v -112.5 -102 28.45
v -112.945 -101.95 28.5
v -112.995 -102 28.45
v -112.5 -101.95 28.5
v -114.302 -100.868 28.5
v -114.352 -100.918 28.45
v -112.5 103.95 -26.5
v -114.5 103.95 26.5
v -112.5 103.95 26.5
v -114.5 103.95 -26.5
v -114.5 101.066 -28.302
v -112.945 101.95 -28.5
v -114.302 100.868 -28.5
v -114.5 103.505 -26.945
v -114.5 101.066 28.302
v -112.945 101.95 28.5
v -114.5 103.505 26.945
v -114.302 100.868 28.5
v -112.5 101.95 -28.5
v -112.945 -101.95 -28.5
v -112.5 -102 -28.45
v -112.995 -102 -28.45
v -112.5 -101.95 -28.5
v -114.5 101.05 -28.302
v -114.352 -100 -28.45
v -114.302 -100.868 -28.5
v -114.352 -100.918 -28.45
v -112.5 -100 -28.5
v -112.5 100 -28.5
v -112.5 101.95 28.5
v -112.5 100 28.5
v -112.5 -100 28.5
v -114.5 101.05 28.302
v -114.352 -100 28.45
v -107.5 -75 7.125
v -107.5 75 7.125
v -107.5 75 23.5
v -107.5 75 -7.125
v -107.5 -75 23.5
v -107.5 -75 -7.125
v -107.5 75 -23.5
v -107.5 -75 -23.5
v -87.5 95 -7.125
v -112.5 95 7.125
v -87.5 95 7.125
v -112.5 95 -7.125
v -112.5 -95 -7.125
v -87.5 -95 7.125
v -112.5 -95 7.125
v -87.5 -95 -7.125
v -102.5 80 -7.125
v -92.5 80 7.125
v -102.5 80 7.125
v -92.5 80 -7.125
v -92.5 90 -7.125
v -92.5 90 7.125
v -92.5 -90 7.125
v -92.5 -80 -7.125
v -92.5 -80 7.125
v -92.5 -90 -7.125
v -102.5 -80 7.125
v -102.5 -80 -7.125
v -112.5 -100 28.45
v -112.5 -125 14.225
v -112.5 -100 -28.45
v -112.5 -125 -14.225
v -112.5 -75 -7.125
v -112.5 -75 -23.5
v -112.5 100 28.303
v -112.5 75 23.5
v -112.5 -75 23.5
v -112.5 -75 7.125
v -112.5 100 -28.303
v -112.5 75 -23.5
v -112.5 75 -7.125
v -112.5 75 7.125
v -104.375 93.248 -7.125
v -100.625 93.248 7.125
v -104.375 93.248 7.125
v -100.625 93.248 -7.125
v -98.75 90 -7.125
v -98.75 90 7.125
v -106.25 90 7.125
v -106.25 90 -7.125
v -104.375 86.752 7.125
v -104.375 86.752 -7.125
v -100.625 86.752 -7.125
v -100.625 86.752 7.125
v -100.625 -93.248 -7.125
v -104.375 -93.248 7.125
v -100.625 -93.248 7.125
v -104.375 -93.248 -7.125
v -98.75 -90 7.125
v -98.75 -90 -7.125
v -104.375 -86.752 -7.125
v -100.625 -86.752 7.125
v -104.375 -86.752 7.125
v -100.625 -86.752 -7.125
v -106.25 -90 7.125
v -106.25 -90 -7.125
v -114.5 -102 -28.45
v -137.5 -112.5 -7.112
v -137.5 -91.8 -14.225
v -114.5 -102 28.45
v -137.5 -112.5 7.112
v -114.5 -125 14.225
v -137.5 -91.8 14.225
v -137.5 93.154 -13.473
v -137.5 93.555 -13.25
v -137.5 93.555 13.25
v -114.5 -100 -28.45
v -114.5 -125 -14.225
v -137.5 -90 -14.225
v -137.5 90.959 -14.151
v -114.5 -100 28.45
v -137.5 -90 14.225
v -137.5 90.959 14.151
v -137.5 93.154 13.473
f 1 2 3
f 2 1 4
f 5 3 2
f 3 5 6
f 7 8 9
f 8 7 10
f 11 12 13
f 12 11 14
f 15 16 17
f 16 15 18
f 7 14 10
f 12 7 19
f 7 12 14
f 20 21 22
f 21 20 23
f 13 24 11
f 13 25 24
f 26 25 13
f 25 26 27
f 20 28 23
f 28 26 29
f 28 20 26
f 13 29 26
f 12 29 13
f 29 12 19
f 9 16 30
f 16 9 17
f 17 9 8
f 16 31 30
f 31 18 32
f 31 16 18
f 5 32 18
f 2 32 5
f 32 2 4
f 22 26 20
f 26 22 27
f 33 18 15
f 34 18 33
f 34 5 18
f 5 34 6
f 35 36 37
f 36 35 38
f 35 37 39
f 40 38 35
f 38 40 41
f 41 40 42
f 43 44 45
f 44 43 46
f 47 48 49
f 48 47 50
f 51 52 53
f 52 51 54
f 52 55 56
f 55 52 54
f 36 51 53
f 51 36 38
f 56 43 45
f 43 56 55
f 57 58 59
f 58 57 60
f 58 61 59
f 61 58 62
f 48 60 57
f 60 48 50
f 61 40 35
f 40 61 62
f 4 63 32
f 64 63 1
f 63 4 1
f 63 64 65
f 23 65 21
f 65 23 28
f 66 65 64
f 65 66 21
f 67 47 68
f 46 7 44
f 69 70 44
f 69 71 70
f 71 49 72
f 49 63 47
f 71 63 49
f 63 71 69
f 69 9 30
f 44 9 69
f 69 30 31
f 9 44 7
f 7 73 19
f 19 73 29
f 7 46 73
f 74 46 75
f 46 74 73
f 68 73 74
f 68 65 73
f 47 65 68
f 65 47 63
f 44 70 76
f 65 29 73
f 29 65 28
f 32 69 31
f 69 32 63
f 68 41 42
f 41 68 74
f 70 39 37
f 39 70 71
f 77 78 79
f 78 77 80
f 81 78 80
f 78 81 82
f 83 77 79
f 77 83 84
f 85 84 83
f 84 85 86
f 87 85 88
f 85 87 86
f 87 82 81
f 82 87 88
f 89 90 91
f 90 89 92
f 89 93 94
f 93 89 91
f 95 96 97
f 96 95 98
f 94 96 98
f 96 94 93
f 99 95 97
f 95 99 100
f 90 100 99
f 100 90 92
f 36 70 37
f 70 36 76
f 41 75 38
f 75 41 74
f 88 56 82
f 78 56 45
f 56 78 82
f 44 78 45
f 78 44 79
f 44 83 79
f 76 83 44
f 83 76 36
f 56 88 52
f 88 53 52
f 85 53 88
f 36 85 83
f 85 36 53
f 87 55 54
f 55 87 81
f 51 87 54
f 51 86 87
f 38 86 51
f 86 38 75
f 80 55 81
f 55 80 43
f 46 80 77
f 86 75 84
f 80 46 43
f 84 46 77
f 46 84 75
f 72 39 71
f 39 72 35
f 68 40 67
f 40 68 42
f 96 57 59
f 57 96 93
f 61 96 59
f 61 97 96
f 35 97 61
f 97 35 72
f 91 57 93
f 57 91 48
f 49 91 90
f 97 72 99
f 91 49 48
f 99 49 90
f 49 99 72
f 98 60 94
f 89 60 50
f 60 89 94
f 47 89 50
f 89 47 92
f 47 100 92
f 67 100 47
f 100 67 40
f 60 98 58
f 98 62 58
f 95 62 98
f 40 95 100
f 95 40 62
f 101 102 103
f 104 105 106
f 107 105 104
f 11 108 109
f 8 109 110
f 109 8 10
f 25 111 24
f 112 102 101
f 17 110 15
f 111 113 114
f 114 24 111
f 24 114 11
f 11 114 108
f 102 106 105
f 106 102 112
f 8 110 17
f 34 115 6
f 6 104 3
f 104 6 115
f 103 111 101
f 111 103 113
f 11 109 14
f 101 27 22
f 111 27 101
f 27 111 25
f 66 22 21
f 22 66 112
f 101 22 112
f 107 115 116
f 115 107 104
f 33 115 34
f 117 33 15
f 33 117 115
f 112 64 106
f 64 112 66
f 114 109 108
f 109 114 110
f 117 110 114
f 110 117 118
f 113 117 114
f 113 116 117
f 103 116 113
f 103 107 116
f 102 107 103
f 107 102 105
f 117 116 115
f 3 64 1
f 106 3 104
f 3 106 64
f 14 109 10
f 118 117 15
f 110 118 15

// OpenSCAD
// file: frame-left.scad
/*
 * SPDX-FileCopyrightText: © 2023 Brian S. Stephan <bss@incorporeal.org>
 * SPDX-License-Identifier: GPL-3.0-or-later
 */

include <parameters.scad>
include <components.scad>

module base_left_frame(lower=false) {
	difference() {
		frame(lower=lower);
		// chop the right edge off
		side_chopper();
	}
}

module left_frame(lower=false) {
	difference() {
		base_left_frame(lower=lower);
		// connection holes to other frames
		frame_connection_holes();

		// cable routing hole
		frame_cable_routing_hole();

		// aux button holes
		translate([-35, 101.5, 0]) rotate([270, 0, 0]) aux_control_three_button_cluster();
		translate([-35, (frame_y/2)-neutrik_panel_thickness-4, 0]) frame_cutout();
		translate([-72, (frame_y/2)-neutrik_panel_thickness-4, 0]) frame_cutout();
		translate([2, (frame_y/2)-neutrik_panel_thickness-4, 0]) frame_cutout();

		// neutrix button hole
		translate([frame_center_to_neutrik, (frame_y/2)-neutrik_panel_thickness, 0])
			rotate([90, 0, 0]) neutrik_d_mount();
		translate([frame_center_to_neutrik, (frame_y/2)-neutrik_panel_thickness-4, 0])
			frame_cutout();
	}
}

left_frame();
// file: frame-piece-top-left-or-right.scad
/*
 * SPDX-FileCopyrightText: © 2024 Brian S. Stephan <bss@incorporeal.org>
 * SPDX-License-Identifier: GPL-3.0-or-later
 */

include <parameters.scad>
include <components.scad>
use <frame-left.scad>

module top_left_or_right_frame_piece() {
    piece_width = panel_support_width+frame_wall+frame_mount_column_width;

	intersection() {
		left_frame();
		difference() {
			// include the whole top wall (including mount columns)
			translate([0, (frame_y/2)-(piece_width/2), 0]) cube([frame_x, piece_width, frame_z], center=true);
			// ...minus the frame wall and lip on the left
			translate([-frame_x/2+frame_wall/2, 0, 0])
				cube([frame_wall, frame_y, frame_z], center=true);
			// ...minus a slot for the combining piece to go into
			cube([frame_x, frame_y-(panel_support_width+frame_wall)*2, frame_z/4], center=true);
		}
	}
}

top_left_or_right_frame_piece();
// file: frame-piece-bottom-left-or-right.scad
/*
 * SPDX-FileCopyrightText: © 2024 Brian S. Stephan <bss@incorporeal.org>
 * SPDX-License-Identifier: GPL-3.0-or-later
 */

include <parameters.scad>
include <components.scad>
use <frame-left.scad>

module bottom_left_or_right_frame_piece(lower=false) {
	piece_width = panel_support_width+frame_wall+frame_mount_column_width;
	intersection() {
		left_frame(lower=lower);
		difference() {
			// include the whole bottom wall (including mount columns)
			translate([0, -(frame_y/2)+(piece_width/2), 0]) cube([frame_x, piece_width, frame_z], center=true);
			// ...minus the frame wall and lip on the left
			translate([-frame_x/2+frame_wall/2, 0, 0])
				cube([frame_wall, frame_y, frame_z], center=true);
			// ...minus a slot for the combining piece to go into
			cube([frame_x, frame_y-(panel_support_width+frame_wall)*2, frame_z/4], center=true);
		}
	}
}

bottom_left_or_right_frame_piece();
// file: frame-piece-side.scad
/*
 * SPDX-FileCopyrightText: © 2024 Brian S. Stephan <bss@incorporeal.org>
 * SPDX-License-Identifier: GPL-3.0-or-later
 */

include <parameters.scad>
include <components.scad>
use <frame-piece-top-left-or-right.scad>
use <frame-piece-bottom-left-or-right.scad>

module side_frame_piece(lower=false) {
	piece_width = panel_support_width+frame_wall+frame_mount_column_width;
	difference() {
		// side piece is left/right agnostic
        frame(lower=lower);
		// minus the top and bottom
		top_left_or_right_frame_piece();
		bottom_left_or_right_frame_piece();
		// and just chop out the rest of the frame
		translate([piece_width, 0, 0]) cube([frame_x, frame_y+1, frame_z+1], center=true);
	}
}

side_frame_piece();
// file: frame-piece-bottom-left-or-right-extended.scad
/*
 * SPDX-FileCopyrightText: © 2024 Brian S. Stephan <bss@incorporeal.org>
 * SPDX-License-Identifier: GPL-3.0-or-later
 */

include <parameters.scad>
include <components.scad>
use <frame-piece-bottom-left-or-right.scad>

module bottom_piece_wall(lower=false) {
	// get a slice of the piece, to use it in extruding
	projection(cut=true) rotate([-90, 0, 0]) translate([0, frame_y/2-frame_bevel_height, 0])
		bottom_left_or_right_frame_piece(lower=lower);
}

module bottom_piece_extension(lower=false) {
	// combine the original with a shrunken piece to "pull" the wall out
	hull() {
		linear_extrude(height=frame_extension_y) scale([1, 0.5, 1]) bottom_piece_wall();
		linear_extrude(height=frame_bevel_height) bottom_piece_wall(lower=lower);
	}
}

module extended_bottom_left_or_right_frame_piece(lower=false) {
	bottom_left_or_right_frame_piece(lower=lower);
	translate([0, -frame_y/2+frame_bevel_height*2, 0]) rotate([90, 0, 0]) bottom_piece_extension(lower=lower);
}

extended_bottom_left_or_right_frame_piece();
// file: parameters.scad
/*
 * SPDX-FileCopyrightText: © 2023 Brian S. Stephan <bss@incorporeal.org>
 * SPDX-License-Identifier: GPL-3.0-or-later
 */

// adjustments
hole_tolerance = 0.15;

// M2
m2_screw_selftap_radius = 0.95;

// M3
m3_screw_selftap_radius = 1.3;

// M4
m4_bolt_radius = 2 + hole_tolerance;
m4_bolt_countersink_radius = 6.1 + hole_tolerance;
m4_bolt_hex_exterior_radius = 3.6 + hole_tolerance;

// 24mm button
small_button_radius = 12 + hole_tolerance;

// 30mm button
big_button_radius = 15 + hole_tolerance;

// JLF mount dimensions
lever_mount_x = 53;
lever_mount_y = 95;
lever_mount_z = 2;

// standard lever hole
lever_plate_hole = 12;

// korean lever hole
korean_lever_plate_hole = 17.6;

// case dimensions
// base frame box. reminder: top of inside (including mounts) is chopped by panel_z for plates
frame_x = 233;
frame_y = 208;
frame_z = 57;

// degree to which the extended frame pieces stick out from the end of the frame
frame_extension_x = 25;
frame_extension_y = 25;

// this sinks the bottom and top of the frame inward a bit, and is used to math out two shapes
// when creating the frame box / overhang panel
frame_bevel_height = 2;
overhang_panel_bevel_height = 1;

frame_center_to_neutrik = 70;

// depth of the "lip" of the frame that the top plate sets into/supports the overhang
frame_wall = 4;

// width of the column in the frame corners to support the hex bolt
frame_mount_column_width = 20;

// per neutrik (mm)
neutrik_panel_thickness = 3;

// top plate, which can either be the whole plate ("inset") or the mounting frame for a plate that overhangs
panel_x = frame_x - (frame_wall * 2);
panel_y = frame_y - (frame_wall * 2);
panel_z = 5;

// how much the top plate x/y is expanded to overhang the frame
// note that this is relative to the top plate (so the wall is added back)
panel_overhang_amount = 8.5;
overhang_panel_x = panel_x + (frame_wall * 2) + (panel_overhang_amount * 2);
overhang_panel_y = panel_y + (frame_wall * 2) + (panel_overhang_amount * 2);

panel_to_frame_point_x = (panel_x/2)-10;
panel_to_frame_point_y = (panel_y/2)-10;

// frame interior that supports the top plates
panel_support_width = 5;

// neutrik D screw holes
neutrik_d_screw_radius = 1.6 + hole_tolerance;
neutrik_d_radius = 12 + hole_tolerance;

// additional button radius for decorative panels, etc.
decorative_radius_scale = 1.75;
jumbo_decorative_radius_scale = 2;
// main file
/*
 * SPDX-FileCopyrightText: © 2024 Brian S. Stephan <bss@incorporeal.org>
 * SPDX-License-Identifier: GPL-3.0-or-later
 */

include <parameters.scad>
include <components.scad>
use <frame-piece-bottom-left-or-right-extended.scad>
use <frame-piece-side.scad>

module side_and_bottom_frame_piece_wall(lower=false) {
	// get a slice of the pieces, to use it in extruding
    projection(cut=true) rotate([0, 90, 0]) translate([frame_x/2-frame_bevel_height, 0, 0])
        side_frame_piece(lower=lower);
    projection(cut=true) translate([0, -frame_y/2+frame_wall, 0]) rotate([90, 90, 0]) bottom_piece_extension();
}

module side_and_bottom_frame_piece_extension(lower=false) {
	// combine the original with a shrunken piece to "pull" the wall out
	hull() {
		linear_extrude(height=frame_extension_y) scale([0.5, 0.90, 1]) side_and_bottom_frame_piece_wall(lower=lower);
		linear_extrude(height=frame_bevel_height) side_and_bottom_frame_piece_wall(lower=lower);
	}
}

module extra_extended_left_or_right_frame_piece(lower=false) {
	difference() {
		side_frame_piece(lower=lower);
		// chop off the old edge which is getting replaced with the extension
		translate([-frame_x/2+frame_bevel_height/2, 0, 0]) cube([frame_bevel_height, frame_y, frame_z], center=true);
	}
	translate([-frame_x/2+frame_bevel_height*2, 0, 0]) rotate([0, -90, 0]) side_and_bottom_frame_piece_extension(lower=lower);
}

extra_extended_left_or_right_frame_piece();
